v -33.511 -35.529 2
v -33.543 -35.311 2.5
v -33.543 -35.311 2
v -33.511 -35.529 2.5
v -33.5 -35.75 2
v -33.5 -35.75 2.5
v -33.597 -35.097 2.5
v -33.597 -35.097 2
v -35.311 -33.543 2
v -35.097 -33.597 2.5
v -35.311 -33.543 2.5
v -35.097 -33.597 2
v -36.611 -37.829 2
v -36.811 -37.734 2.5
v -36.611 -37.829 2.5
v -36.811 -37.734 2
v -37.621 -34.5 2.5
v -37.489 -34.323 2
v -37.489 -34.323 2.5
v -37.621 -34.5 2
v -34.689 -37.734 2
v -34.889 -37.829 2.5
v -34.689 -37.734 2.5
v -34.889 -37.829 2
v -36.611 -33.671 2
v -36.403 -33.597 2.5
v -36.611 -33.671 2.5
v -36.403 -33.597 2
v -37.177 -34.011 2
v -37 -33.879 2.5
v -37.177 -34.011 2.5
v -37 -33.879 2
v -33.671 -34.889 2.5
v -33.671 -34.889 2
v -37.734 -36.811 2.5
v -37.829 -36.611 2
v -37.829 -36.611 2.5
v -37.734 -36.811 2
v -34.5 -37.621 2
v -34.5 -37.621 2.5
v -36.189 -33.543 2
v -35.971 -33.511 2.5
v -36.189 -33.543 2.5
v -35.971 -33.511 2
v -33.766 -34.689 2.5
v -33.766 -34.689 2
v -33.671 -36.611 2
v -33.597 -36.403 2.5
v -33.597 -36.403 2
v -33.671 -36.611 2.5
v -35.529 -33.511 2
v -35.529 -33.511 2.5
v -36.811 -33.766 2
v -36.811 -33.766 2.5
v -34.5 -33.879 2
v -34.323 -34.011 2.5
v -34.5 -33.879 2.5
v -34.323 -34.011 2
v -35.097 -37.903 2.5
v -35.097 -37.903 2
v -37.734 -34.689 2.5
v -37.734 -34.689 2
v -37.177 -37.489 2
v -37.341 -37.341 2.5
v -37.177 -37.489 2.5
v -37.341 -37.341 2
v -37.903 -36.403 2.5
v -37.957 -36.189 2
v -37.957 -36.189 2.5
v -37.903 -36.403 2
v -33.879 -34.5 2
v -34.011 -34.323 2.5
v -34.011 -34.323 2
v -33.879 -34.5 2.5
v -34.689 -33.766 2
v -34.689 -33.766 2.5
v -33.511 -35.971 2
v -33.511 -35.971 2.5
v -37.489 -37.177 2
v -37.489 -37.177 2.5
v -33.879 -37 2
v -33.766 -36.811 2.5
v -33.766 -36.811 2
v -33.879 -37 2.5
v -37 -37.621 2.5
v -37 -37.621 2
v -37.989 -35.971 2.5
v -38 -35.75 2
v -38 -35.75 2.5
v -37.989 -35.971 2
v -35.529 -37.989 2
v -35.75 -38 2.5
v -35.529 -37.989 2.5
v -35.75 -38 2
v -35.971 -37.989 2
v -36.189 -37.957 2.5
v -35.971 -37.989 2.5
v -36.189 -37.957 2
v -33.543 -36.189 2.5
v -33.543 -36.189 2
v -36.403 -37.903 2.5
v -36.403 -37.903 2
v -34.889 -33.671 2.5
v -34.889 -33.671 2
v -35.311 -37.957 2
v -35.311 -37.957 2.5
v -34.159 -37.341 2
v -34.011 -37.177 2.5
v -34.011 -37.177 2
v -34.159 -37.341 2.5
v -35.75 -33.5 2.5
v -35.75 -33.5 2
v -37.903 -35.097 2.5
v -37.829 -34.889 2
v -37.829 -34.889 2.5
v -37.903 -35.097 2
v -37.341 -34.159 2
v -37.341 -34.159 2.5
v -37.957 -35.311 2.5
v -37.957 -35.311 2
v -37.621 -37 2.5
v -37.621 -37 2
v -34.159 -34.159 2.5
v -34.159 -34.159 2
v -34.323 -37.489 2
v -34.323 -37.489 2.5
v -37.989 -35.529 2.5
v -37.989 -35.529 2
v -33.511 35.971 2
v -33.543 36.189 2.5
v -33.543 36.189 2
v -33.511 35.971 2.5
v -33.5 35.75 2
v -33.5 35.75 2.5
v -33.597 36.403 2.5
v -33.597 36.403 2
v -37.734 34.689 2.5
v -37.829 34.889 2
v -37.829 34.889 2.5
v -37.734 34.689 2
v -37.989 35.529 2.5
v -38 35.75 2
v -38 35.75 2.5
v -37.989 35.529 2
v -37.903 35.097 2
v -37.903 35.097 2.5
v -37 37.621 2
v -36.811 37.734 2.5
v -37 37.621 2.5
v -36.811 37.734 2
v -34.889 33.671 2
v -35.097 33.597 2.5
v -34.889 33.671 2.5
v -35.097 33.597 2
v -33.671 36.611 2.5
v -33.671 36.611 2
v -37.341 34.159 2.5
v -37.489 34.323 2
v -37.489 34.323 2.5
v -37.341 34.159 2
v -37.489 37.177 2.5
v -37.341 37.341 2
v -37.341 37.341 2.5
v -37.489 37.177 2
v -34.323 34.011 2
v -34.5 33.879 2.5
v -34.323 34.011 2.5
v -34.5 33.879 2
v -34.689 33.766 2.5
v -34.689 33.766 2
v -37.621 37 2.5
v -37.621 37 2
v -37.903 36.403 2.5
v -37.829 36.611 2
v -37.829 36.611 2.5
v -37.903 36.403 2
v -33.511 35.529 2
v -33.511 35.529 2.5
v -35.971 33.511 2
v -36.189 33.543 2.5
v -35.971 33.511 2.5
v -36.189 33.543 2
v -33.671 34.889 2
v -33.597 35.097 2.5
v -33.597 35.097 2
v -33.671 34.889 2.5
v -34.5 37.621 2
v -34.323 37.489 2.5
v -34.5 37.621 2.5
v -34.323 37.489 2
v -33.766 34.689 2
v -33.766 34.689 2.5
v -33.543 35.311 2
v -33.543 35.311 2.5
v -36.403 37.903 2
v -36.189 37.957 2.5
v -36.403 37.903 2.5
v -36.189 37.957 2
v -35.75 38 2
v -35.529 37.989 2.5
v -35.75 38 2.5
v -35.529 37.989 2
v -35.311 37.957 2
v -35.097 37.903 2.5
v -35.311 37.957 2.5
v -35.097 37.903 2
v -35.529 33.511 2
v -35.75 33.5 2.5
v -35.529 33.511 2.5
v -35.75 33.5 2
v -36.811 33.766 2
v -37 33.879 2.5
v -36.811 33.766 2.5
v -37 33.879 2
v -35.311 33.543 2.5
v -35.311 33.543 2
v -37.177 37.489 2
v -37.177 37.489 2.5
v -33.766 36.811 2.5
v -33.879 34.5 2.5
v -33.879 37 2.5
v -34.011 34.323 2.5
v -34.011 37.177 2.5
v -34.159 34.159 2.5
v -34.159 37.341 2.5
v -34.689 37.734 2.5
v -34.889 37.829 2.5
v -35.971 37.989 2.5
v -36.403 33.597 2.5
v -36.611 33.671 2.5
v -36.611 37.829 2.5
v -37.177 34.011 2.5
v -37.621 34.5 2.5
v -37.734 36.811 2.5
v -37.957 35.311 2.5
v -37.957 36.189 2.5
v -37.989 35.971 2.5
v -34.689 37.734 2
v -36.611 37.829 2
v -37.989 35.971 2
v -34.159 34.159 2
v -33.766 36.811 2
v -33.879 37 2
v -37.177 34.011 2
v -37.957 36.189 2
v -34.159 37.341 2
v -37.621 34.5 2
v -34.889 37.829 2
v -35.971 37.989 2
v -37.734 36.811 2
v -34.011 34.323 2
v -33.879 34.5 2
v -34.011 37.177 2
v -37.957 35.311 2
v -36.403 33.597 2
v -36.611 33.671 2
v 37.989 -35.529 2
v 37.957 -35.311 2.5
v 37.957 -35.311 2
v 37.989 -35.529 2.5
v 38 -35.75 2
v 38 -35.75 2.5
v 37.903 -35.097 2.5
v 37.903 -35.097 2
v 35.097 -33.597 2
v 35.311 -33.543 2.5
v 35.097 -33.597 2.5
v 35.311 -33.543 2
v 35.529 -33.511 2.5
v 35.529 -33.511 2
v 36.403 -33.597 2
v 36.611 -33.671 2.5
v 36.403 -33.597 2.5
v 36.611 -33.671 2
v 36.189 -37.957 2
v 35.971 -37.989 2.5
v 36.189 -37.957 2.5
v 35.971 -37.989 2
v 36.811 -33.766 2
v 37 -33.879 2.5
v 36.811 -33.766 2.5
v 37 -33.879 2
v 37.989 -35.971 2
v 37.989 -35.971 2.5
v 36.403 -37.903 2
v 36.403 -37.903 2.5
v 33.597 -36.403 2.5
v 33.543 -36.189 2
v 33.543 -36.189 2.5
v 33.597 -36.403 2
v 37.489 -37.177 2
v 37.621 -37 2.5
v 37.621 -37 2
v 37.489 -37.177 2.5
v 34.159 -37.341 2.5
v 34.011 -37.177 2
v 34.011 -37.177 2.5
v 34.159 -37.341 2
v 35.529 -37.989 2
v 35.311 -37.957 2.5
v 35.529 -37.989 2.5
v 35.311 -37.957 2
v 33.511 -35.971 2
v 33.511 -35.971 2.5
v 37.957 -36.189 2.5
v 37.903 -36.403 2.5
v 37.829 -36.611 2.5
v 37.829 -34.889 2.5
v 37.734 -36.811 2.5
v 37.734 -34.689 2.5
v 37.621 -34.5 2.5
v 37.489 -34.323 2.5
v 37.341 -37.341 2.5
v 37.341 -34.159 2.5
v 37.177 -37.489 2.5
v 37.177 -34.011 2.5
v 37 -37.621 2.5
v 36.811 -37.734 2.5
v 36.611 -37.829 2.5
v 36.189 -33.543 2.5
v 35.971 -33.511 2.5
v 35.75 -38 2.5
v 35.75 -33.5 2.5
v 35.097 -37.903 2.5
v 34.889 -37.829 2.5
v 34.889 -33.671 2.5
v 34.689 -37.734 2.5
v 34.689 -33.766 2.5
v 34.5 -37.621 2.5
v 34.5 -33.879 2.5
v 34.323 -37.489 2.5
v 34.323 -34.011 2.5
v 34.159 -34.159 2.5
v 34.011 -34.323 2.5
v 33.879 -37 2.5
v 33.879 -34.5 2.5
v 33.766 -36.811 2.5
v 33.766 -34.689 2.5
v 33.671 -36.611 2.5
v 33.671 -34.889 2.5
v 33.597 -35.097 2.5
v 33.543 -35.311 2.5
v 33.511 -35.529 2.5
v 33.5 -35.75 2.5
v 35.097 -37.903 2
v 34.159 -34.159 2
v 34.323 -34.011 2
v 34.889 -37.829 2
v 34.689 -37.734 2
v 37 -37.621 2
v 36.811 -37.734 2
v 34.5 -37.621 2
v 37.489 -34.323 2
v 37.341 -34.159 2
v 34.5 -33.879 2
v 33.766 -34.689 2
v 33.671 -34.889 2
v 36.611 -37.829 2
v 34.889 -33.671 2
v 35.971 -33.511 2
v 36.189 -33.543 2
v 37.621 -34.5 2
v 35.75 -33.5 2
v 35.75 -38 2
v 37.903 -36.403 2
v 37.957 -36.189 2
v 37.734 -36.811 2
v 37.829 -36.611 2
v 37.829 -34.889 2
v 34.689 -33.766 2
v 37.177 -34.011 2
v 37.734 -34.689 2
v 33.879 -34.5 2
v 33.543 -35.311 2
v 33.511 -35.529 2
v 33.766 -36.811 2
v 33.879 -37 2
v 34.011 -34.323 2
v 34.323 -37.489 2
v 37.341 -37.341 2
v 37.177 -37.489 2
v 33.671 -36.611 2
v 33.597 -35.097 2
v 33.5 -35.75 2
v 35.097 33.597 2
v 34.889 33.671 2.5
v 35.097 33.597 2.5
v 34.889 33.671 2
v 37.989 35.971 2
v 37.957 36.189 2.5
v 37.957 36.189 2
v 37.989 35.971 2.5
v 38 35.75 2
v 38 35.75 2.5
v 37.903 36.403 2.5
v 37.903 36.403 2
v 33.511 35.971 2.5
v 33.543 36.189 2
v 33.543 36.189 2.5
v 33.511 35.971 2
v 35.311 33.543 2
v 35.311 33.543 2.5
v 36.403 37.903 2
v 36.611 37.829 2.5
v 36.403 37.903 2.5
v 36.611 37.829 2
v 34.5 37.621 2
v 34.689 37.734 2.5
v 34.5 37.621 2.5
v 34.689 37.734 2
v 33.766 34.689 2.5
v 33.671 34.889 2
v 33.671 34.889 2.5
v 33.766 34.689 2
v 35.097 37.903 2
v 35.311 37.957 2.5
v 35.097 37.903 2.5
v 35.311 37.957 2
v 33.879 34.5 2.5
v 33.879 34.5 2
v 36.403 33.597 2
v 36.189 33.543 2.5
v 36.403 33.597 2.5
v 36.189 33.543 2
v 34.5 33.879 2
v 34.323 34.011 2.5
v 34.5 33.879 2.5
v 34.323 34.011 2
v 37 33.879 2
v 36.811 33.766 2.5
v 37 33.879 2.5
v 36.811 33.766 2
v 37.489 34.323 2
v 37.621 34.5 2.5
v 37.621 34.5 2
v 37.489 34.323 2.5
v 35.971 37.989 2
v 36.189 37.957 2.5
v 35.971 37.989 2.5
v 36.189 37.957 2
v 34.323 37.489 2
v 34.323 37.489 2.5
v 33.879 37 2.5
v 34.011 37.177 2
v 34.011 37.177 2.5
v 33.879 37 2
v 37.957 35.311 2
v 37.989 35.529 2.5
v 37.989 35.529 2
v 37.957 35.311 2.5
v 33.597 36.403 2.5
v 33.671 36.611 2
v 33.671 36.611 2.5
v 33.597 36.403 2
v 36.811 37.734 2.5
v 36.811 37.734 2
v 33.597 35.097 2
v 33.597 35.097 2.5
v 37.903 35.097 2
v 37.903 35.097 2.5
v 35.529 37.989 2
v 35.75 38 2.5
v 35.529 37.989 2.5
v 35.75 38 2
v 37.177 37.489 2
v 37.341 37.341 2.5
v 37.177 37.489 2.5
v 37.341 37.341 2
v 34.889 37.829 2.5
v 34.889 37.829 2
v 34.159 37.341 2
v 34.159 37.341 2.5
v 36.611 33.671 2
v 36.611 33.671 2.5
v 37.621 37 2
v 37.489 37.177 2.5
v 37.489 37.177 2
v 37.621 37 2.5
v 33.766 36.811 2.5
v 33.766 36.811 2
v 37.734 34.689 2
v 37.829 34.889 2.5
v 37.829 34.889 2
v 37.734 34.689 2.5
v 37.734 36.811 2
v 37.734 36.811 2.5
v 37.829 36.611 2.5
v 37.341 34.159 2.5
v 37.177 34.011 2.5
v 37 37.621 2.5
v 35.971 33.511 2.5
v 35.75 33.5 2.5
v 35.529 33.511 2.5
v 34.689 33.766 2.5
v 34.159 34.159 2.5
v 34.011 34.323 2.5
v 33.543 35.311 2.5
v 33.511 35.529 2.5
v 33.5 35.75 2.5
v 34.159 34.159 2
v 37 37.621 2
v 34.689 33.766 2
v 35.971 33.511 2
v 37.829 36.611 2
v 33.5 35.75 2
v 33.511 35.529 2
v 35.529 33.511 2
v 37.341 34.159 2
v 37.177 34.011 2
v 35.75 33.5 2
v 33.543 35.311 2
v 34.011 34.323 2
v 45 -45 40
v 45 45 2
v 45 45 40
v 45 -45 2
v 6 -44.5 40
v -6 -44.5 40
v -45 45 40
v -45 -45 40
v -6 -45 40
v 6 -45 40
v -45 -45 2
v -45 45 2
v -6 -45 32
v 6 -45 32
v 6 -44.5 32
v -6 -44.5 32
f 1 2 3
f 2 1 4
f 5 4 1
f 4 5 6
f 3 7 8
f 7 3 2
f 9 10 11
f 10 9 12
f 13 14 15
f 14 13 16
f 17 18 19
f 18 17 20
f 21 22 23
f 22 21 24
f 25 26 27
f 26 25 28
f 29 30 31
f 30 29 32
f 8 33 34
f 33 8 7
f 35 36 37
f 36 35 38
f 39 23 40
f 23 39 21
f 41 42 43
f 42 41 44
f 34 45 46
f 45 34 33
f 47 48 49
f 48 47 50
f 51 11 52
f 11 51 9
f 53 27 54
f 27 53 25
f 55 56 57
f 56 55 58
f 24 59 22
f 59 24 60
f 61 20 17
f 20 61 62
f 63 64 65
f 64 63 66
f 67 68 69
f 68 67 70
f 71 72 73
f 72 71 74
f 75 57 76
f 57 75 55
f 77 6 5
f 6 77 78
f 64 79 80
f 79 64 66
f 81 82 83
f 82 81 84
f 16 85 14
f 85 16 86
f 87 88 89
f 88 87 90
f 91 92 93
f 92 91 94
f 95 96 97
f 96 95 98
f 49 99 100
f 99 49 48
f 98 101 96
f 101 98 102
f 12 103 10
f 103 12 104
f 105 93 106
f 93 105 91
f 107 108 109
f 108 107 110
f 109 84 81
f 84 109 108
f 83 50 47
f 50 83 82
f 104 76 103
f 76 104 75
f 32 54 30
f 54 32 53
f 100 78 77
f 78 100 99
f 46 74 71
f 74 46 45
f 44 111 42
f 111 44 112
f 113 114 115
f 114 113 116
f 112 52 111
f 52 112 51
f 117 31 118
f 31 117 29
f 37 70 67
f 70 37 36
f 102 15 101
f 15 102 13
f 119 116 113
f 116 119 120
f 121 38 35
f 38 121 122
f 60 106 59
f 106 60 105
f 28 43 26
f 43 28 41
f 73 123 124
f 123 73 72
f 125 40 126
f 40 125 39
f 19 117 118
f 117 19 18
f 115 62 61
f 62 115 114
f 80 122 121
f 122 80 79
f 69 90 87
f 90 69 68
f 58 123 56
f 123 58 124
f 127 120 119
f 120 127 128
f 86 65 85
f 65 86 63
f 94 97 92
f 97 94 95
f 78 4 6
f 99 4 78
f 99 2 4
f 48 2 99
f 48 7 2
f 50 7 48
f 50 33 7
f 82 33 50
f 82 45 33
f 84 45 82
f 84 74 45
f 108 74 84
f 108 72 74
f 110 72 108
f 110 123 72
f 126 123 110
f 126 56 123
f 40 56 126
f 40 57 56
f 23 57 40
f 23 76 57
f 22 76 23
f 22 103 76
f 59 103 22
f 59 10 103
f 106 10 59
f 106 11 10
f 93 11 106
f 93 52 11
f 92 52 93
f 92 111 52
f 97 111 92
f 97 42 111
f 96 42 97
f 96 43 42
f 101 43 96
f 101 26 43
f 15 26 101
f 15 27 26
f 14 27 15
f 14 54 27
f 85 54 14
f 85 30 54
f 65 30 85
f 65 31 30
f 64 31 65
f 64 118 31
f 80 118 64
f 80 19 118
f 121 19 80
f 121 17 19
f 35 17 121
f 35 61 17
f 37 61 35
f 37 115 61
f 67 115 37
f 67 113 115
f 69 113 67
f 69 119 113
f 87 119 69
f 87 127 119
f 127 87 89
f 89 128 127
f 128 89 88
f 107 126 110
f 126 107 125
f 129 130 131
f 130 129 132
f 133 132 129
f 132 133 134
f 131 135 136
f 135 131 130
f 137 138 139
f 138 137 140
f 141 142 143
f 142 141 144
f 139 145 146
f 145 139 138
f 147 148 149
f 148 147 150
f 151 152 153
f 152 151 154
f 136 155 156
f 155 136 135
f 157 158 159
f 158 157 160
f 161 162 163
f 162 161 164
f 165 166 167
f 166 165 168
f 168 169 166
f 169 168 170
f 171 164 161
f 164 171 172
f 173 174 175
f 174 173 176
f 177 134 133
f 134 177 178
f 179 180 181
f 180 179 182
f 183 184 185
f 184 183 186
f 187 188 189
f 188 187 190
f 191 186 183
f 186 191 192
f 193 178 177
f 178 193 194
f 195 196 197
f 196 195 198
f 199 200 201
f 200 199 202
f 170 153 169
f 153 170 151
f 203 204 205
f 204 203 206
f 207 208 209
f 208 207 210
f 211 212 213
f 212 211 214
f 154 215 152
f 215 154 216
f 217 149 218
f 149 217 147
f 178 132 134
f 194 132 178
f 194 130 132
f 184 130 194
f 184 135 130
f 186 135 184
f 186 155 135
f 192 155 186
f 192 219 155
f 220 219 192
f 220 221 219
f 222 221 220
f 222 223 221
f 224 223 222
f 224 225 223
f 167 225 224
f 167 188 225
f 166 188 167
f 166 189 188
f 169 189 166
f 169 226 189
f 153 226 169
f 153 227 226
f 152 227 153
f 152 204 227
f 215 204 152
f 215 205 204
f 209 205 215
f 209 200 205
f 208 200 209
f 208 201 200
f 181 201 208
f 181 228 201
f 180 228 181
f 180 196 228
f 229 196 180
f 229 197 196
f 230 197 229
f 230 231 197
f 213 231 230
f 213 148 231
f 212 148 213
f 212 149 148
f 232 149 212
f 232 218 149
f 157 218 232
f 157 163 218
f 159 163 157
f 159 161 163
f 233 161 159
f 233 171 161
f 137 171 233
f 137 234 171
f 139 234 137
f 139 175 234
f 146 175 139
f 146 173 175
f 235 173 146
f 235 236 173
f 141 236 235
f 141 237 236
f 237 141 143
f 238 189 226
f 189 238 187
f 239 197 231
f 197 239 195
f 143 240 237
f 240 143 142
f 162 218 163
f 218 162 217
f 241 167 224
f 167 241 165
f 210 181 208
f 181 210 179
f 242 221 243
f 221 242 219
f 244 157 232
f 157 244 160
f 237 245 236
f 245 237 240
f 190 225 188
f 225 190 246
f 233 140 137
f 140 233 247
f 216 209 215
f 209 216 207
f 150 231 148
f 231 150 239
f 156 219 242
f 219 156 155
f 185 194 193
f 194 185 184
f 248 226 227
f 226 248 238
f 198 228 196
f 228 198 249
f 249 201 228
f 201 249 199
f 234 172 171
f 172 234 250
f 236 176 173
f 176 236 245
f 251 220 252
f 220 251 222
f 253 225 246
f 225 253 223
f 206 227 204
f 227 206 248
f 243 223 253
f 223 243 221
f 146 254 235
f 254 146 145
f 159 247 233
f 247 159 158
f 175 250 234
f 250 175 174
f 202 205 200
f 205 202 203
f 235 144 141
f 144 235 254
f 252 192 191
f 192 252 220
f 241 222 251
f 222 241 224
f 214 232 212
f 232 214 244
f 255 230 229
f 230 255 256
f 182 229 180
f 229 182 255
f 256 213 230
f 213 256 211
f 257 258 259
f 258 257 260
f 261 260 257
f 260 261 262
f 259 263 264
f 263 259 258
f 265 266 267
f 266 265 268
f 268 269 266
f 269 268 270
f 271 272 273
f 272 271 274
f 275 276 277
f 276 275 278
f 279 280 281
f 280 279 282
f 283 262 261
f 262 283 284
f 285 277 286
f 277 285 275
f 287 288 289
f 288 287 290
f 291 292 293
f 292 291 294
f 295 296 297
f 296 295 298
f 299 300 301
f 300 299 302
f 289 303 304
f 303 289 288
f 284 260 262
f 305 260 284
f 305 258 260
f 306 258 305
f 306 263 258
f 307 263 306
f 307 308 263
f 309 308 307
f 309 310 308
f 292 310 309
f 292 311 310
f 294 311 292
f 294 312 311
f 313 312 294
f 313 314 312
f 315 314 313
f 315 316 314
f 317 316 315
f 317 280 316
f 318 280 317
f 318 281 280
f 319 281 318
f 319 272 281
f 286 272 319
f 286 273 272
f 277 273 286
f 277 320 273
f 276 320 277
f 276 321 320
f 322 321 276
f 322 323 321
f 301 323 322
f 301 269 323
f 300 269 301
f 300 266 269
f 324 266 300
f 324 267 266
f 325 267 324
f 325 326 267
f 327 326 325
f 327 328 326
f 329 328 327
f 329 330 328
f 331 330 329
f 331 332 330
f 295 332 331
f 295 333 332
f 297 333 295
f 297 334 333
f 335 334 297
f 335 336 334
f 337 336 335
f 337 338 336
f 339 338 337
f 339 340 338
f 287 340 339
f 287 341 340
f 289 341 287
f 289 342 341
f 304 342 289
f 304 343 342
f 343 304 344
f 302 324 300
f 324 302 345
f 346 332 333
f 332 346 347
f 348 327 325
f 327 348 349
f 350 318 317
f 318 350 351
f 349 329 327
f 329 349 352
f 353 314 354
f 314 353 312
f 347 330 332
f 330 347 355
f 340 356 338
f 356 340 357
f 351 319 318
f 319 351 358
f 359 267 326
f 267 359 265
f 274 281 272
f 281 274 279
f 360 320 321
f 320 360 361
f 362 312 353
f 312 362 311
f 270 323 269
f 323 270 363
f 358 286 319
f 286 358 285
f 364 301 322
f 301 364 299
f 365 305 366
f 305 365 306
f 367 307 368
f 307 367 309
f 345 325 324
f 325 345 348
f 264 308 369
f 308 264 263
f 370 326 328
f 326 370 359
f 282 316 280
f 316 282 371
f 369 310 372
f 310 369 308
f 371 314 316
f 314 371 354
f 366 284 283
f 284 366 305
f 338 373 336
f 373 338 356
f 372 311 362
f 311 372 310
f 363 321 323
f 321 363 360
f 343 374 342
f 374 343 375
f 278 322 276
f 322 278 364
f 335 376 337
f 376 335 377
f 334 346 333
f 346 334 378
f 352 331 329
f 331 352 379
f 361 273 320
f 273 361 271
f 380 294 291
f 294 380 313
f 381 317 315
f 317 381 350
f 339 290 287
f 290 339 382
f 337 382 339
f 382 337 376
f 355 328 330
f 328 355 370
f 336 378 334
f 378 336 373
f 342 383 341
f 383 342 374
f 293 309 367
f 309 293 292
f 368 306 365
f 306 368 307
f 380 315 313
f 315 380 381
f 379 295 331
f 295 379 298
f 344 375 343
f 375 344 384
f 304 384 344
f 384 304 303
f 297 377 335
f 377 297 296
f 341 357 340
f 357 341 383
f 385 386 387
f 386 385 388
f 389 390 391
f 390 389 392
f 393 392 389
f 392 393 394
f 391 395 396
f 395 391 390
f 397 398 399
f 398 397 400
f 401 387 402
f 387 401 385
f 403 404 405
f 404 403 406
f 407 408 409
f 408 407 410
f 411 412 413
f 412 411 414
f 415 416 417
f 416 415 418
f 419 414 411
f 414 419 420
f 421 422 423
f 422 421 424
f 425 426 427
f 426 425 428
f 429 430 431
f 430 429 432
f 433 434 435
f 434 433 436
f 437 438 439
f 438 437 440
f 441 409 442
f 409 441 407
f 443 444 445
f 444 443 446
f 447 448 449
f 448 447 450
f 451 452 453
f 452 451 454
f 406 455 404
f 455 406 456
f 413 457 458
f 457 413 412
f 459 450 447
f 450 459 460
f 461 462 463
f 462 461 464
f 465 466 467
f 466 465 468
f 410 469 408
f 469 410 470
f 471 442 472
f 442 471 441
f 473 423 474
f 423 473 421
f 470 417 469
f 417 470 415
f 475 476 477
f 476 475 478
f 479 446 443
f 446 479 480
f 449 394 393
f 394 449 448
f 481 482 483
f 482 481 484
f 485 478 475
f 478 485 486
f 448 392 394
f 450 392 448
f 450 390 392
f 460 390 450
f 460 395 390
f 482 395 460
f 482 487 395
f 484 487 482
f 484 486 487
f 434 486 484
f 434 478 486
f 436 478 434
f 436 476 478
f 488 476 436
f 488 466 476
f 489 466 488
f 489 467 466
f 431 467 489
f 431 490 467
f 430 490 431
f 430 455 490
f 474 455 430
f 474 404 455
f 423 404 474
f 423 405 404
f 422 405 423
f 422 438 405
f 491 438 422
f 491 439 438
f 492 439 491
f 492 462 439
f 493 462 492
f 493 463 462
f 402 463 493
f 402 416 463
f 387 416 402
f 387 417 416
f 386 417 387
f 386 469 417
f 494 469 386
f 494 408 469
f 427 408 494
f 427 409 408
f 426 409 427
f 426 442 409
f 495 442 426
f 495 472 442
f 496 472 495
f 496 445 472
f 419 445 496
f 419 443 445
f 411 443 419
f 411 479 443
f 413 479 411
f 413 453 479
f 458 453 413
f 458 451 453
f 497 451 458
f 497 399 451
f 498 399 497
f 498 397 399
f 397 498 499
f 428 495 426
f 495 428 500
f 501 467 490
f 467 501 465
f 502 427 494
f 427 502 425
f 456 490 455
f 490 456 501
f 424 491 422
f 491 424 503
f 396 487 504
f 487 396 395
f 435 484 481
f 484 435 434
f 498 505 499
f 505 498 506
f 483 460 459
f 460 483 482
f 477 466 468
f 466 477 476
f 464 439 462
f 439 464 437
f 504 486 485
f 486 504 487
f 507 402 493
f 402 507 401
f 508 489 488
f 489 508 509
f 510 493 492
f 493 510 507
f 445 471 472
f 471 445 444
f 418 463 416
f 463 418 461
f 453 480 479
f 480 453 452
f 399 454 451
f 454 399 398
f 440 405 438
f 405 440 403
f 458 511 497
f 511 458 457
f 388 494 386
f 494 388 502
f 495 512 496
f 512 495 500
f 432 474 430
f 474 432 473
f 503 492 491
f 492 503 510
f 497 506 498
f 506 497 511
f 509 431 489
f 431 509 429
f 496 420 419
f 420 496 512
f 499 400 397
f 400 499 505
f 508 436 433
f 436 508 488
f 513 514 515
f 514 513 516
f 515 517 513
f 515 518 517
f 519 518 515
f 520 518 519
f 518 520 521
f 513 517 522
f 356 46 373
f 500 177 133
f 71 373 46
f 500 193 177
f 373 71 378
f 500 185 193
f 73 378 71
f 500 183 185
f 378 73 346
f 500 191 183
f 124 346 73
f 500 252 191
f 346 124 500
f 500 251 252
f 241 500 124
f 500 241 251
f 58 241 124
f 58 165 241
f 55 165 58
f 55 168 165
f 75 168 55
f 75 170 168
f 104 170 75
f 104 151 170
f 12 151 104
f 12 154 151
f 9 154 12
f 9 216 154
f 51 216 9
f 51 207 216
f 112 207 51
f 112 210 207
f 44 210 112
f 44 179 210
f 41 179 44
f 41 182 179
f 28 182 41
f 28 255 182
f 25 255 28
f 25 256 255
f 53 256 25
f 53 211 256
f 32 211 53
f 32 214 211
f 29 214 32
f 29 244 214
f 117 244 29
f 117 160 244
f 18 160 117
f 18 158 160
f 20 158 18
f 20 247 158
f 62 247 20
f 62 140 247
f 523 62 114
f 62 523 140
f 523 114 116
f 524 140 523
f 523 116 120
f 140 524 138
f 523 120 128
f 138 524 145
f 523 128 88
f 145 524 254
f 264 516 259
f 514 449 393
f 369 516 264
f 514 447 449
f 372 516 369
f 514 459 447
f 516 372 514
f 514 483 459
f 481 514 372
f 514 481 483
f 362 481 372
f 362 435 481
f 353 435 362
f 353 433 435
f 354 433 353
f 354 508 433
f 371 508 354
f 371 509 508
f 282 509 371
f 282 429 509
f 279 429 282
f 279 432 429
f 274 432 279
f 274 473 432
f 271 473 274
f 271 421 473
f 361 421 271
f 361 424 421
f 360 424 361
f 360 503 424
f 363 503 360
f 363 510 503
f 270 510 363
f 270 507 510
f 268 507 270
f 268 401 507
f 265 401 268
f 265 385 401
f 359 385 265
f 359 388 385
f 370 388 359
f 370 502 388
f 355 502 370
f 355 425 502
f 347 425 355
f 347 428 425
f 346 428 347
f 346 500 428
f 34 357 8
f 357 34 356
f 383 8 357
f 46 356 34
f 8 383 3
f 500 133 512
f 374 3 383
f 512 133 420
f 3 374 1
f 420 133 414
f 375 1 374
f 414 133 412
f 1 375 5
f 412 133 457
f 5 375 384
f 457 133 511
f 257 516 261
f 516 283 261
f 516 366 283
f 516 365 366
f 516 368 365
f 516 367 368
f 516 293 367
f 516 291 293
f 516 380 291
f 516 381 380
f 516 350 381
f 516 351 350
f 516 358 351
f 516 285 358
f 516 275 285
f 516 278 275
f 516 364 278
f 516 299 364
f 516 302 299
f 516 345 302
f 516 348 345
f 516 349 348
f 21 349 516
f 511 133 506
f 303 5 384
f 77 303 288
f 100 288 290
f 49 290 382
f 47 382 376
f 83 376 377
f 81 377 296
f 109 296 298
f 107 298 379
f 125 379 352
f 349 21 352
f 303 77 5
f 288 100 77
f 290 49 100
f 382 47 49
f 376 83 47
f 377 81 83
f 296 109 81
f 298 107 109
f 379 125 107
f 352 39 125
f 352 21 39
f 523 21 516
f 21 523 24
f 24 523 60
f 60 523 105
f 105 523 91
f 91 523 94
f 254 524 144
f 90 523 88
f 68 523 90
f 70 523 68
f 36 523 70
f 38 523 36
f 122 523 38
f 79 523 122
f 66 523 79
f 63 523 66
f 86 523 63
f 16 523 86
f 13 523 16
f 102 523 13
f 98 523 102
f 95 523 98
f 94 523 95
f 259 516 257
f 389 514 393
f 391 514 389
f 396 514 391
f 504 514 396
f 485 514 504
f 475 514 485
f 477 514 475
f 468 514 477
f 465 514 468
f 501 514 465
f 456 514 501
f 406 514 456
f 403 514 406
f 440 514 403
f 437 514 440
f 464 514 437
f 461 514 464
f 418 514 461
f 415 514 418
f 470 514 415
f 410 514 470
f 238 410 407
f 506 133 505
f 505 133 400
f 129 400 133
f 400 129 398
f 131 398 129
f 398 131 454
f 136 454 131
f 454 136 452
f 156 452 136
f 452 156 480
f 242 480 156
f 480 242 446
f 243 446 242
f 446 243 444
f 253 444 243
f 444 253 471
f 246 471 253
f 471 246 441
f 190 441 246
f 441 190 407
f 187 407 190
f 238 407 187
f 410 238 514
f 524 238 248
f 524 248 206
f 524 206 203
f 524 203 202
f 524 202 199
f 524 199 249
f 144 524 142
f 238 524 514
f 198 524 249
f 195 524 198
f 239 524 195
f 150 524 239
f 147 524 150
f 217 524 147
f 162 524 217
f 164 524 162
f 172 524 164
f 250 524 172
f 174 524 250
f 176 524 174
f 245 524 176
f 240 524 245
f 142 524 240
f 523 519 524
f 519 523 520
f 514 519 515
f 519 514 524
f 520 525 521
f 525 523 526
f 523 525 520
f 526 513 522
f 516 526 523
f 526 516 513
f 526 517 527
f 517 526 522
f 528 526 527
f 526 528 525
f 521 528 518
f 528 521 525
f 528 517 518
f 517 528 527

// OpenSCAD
// Magnetic stirrer housing - open box covering an 80 mm PC fan
// Print orientation: top plate on bed (z = 0), walls rise to z = 40

// ---- Dimensions (mm) ----
top_t       = 2;     // top plate thickness
wall_t      = 2.5;   // wall thickness
box_h       = 40;    // wall height (open top at z = 40)
outer_w     = 90;    // outer size in X and Y
hole_d      = 4.5;   // M4 screw hole diameter
hole_pitch  = 71.5;  // square pattern size for screw holes
notch_w     = 12;    // cable notch width
notch_bottom = 32;   // notch floor height (notch runs z = 32 to 40)
eps         = 0.5;   // cutter overshoot past faces

$fn = 64;

difference() {
    // Solid box: outer dimensions, open top
    translate([-outer_w/2, -outer_w/2, top_t])
        cube([outer_w, outer_w, box_h - top_t]);

    // Fan mounting holes through the top plate
    for (sx = [-hole_pitch/2, hole_pitch/2])
        for (sy = [-hole_pitch/2, hole_pitch/2])
            translate([sx, sy, -eps])
                cylinder(d = hole_d, h = top_t + 2*eps);

    // Cable notch in one wall, centred along the wall
    translate([-notch_w/2, -outer_w/2 - wall_t, notch_bottom])
        cube([notch_w, wall_t + eps, box_h - notch_bottom + eps]);
}
